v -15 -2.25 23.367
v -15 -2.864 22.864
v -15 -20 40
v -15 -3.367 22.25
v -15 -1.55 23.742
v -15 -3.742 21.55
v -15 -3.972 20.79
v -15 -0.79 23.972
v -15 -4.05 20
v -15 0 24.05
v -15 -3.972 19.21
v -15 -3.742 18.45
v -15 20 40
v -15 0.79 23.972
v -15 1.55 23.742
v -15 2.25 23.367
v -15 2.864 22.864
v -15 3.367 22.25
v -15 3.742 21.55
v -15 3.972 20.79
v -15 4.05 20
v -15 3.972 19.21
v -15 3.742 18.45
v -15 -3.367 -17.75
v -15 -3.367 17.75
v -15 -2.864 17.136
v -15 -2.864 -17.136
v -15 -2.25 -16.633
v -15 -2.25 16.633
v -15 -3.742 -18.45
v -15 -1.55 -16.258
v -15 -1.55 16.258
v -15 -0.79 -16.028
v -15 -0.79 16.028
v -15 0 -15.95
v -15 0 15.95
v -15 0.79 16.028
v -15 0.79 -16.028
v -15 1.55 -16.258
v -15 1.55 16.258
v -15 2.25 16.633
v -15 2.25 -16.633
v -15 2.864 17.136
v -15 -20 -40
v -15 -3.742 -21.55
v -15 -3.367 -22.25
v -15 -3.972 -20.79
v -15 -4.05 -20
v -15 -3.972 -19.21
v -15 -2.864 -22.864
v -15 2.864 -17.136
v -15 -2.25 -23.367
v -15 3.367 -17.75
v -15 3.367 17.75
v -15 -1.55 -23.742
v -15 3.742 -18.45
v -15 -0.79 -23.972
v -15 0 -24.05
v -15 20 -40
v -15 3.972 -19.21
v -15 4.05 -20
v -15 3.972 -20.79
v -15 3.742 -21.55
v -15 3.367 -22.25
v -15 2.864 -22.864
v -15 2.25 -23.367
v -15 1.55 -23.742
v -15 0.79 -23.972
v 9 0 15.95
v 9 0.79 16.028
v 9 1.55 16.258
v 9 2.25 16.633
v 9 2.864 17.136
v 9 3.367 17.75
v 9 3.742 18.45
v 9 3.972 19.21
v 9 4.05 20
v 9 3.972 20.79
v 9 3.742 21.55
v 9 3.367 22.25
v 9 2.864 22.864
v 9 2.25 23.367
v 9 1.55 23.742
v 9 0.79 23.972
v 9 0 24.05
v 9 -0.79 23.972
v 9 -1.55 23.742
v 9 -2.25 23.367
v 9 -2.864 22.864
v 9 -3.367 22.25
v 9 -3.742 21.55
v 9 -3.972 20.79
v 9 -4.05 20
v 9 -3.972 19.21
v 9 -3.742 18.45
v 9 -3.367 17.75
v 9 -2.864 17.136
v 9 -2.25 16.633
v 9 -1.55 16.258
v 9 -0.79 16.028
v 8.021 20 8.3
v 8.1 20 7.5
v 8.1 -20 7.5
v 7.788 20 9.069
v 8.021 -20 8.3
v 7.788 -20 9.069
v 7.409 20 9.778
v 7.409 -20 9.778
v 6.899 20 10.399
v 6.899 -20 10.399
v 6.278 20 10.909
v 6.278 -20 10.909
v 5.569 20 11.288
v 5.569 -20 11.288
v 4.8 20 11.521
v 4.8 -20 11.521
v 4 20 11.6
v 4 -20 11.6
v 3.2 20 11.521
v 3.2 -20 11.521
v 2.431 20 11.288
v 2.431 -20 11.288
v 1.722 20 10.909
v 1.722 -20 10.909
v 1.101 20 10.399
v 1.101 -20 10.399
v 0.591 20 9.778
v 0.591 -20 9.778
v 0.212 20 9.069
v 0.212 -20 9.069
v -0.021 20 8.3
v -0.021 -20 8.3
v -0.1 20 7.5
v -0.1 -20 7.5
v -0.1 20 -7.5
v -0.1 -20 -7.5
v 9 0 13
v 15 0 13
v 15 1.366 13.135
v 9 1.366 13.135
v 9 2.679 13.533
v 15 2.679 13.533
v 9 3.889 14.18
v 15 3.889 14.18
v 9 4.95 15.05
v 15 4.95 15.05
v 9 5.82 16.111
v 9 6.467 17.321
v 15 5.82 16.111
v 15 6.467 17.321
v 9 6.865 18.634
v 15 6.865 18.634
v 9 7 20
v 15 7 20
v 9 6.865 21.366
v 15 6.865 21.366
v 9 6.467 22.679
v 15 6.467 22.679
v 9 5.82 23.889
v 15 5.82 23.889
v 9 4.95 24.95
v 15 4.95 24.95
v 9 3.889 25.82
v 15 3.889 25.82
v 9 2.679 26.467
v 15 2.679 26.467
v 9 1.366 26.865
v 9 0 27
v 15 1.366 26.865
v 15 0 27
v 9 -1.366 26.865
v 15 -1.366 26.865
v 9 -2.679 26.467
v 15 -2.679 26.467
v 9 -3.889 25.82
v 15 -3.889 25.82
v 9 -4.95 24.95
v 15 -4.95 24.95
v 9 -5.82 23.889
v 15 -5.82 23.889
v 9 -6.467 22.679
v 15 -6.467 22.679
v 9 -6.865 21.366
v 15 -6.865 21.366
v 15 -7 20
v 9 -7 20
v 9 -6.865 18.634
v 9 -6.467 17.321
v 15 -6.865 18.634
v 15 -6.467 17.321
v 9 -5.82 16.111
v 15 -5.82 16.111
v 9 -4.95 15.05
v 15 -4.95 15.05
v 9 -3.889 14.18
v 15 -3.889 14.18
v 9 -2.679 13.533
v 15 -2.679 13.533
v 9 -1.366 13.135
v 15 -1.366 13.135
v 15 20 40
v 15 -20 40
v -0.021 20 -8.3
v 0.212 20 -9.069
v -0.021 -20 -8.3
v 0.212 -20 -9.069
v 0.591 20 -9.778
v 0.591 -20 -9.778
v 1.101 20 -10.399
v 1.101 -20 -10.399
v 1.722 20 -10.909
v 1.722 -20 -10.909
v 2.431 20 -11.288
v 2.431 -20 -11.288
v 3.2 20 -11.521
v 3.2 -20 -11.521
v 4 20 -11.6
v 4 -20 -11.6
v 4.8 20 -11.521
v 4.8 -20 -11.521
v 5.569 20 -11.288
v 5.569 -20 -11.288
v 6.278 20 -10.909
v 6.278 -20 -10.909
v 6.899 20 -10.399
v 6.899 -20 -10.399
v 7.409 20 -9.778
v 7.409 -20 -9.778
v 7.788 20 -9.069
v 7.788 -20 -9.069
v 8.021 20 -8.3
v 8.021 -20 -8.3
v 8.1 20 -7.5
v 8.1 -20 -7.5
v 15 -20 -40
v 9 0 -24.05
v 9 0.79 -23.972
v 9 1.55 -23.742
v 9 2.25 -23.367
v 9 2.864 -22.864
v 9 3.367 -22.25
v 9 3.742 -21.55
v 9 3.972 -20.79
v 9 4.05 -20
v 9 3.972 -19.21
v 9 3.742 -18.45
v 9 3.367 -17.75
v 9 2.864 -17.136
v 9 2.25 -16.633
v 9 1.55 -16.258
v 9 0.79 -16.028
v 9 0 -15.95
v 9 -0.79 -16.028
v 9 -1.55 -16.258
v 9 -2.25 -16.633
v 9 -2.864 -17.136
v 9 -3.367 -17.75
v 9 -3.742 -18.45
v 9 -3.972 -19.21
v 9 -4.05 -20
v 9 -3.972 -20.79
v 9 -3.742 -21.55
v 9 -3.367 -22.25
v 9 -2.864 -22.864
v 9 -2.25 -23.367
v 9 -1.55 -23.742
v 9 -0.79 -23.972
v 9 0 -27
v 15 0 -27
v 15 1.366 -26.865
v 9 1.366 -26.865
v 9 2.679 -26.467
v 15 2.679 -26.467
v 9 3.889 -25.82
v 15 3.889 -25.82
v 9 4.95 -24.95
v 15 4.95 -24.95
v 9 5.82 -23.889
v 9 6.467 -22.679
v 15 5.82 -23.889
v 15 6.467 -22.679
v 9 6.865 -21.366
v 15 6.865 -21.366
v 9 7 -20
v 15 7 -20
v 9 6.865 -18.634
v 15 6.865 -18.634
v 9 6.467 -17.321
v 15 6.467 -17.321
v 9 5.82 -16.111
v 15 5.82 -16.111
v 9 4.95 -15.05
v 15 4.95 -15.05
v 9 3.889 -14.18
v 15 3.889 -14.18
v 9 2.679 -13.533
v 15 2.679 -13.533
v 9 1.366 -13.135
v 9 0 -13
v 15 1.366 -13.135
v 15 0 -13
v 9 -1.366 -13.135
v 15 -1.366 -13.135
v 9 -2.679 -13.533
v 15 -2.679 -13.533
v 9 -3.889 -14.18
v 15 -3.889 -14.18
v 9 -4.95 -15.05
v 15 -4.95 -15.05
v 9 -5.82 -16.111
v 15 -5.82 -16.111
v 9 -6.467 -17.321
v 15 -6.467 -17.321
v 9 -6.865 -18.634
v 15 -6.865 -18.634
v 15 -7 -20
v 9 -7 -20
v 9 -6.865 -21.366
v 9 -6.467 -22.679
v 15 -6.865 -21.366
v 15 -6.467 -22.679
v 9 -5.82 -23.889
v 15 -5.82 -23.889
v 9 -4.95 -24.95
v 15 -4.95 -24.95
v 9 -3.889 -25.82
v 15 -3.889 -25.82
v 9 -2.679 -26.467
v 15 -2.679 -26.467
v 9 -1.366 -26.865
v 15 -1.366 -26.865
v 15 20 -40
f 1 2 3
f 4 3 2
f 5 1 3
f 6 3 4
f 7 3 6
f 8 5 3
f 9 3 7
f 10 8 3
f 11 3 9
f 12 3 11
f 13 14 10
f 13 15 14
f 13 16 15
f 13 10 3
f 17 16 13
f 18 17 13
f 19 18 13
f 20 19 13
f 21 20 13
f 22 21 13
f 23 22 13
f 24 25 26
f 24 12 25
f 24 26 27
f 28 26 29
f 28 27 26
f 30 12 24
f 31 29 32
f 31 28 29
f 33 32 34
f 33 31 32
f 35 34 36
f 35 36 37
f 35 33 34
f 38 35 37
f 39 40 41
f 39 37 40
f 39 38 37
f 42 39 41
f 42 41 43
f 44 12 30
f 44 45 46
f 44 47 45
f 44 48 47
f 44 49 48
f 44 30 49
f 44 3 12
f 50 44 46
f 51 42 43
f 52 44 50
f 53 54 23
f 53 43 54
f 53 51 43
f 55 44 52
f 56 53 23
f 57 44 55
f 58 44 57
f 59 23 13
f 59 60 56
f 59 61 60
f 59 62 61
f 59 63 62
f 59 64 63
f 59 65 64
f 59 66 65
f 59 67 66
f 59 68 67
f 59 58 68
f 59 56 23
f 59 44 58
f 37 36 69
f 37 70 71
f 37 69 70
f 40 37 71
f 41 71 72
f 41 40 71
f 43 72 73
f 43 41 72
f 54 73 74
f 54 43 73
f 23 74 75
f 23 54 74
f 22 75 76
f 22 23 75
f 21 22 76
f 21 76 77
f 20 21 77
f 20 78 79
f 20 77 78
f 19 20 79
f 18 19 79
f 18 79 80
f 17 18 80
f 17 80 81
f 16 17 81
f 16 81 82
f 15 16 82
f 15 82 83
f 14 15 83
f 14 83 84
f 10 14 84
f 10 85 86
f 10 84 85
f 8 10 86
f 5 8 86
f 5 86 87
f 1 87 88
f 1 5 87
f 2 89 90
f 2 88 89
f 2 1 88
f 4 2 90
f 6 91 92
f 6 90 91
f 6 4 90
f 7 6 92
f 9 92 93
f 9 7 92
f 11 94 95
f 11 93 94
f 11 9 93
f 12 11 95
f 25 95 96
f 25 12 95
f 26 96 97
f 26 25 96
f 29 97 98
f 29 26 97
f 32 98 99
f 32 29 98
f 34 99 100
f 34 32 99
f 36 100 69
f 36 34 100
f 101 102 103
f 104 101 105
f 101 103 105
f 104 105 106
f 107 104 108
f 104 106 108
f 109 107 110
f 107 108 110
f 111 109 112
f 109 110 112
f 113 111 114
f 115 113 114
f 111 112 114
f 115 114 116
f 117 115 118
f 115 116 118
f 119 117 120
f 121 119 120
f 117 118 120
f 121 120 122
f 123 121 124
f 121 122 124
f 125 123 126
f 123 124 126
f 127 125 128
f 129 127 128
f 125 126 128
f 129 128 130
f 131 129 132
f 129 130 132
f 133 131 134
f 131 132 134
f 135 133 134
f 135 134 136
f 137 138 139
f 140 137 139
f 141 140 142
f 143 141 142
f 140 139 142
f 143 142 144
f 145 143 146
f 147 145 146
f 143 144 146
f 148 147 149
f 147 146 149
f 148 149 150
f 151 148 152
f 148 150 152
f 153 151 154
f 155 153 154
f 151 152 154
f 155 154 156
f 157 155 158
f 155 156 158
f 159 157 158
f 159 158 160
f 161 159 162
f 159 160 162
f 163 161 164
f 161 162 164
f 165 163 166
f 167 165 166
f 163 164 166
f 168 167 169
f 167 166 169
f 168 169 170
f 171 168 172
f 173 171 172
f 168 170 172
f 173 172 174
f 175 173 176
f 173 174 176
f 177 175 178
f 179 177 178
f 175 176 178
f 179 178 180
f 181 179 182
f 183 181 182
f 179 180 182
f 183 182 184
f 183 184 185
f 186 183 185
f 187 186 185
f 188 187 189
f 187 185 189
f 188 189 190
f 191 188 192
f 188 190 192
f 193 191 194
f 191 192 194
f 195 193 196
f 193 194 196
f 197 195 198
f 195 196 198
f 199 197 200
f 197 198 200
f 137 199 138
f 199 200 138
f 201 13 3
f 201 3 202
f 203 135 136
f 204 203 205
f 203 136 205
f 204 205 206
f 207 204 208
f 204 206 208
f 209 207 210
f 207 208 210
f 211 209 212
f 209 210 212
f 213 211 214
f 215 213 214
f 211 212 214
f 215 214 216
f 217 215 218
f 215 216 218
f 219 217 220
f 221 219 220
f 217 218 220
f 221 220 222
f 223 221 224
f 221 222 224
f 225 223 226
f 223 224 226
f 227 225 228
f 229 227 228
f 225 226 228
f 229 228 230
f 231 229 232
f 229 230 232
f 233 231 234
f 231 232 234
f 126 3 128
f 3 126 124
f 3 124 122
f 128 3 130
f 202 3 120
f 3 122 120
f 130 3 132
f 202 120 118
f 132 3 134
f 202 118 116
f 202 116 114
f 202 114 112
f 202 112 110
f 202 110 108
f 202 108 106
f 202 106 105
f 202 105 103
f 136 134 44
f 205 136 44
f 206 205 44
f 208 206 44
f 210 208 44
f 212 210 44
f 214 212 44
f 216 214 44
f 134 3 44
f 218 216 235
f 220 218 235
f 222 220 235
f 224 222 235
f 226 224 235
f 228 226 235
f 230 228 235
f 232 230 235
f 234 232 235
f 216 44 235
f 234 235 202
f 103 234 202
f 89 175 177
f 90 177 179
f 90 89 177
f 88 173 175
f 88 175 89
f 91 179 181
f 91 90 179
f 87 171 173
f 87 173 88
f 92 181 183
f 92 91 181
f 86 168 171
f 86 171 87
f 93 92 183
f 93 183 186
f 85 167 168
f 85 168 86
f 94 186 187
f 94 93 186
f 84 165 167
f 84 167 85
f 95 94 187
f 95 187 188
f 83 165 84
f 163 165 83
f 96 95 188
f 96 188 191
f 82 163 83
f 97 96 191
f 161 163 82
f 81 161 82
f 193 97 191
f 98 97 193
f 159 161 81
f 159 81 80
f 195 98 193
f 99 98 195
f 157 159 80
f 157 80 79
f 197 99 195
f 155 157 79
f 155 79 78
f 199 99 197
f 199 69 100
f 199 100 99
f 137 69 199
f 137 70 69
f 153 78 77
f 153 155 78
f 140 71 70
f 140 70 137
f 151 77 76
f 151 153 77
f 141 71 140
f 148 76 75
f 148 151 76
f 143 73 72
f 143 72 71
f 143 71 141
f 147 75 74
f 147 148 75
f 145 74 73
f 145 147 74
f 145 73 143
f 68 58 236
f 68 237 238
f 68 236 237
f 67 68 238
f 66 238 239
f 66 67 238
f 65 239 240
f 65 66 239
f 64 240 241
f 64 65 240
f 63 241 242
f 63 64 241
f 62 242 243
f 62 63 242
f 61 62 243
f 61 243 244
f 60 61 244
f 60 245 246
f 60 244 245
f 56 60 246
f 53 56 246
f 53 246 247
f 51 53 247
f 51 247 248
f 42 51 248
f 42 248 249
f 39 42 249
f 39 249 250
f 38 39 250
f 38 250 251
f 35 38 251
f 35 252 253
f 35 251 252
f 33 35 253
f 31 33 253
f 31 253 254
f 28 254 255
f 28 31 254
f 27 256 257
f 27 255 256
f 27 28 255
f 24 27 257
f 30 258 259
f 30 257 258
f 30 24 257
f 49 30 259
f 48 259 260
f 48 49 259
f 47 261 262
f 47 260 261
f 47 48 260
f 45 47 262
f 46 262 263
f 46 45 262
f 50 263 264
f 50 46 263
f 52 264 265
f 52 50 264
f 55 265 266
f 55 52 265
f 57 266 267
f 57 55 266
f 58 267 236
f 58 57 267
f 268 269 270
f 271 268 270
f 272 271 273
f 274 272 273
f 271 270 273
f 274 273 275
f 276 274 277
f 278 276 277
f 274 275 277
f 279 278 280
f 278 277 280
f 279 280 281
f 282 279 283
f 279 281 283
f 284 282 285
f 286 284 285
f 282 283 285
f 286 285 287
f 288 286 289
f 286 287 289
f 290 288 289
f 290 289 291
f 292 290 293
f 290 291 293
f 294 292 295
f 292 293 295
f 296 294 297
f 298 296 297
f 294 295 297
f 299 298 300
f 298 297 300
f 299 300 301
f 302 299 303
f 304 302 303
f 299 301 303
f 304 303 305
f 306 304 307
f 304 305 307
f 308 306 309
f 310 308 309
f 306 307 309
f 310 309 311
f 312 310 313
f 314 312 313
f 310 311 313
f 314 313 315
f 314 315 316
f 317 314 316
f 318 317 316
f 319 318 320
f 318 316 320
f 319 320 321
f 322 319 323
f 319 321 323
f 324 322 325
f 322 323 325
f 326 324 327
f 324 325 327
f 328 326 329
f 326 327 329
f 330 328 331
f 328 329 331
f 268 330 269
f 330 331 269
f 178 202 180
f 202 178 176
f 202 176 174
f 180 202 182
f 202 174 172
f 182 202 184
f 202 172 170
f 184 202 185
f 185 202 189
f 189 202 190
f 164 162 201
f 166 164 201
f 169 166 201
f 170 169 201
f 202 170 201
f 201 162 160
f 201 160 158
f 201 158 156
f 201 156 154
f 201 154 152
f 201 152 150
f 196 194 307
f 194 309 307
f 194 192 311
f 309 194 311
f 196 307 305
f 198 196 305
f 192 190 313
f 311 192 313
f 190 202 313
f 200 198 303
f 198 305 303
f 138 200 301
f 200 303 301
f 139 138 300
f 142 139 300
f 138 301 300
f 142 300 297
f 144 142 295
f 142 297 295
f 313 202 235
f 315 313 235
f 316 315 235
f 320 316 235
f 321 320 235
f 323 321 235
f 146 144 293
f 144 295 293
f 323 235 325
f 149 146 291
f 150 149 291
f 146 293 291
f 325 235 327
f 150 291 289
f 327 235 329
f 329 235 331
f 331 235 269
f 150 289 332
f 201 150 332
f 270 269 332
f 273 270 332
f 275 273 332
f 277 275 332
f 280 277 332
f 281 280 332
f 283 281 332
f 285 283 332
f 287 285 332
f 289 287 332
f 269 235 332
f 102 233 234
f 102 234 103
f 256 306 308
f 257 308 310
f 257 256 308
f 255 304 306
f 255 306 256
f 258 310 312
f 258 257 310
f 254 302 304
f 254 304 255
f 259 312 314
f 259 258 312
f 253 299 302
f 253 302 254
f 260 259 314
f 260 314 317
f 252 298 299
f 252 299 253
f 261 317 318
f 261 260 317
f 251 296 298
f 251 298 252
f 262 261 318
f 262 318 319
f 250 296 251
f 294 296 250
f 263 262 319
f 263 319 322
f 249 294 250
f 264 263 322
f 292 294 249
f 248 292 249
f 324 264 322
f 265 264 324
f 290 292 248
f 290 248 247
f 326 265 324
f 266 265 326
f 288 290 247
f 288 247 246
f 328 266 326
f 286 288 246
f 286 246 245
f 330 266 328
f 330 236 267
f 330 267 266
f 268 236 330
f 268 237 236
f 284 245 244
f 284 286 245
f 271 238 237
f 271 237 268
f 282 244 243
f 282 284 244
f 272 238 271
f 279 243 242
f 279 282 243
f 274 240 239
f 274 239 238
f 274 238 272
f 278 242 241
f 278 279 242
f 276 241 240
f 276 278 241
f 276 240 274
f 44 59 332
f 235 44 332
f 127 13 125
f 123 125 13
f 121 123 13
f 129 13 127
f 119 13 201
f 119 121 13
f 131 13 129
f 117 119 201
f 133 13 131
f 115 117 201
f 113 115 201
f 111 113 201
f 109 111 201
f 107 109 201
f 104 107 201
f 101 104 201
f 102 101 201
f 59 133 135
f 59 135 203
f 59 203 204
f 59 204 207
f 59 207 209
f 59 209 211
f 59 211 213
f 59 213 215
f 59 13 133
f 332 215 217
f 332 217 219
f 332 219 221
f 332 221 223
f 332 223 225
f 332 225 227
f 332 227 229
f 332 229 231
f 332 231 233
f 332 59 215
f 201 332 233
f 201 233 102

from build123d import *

# Parameters (mm, degrees)
BOSS_EXTRUDE1_DEPTH      = 40
BOSS_EXTRUDE1_DEPTH_BACK = 40
SKETCH1_W                = 30
SKETCH1_H                = 40
CUT_EXTRUDE1_DEPTH       = 80
CUT_EXTRUDE1_DEPTH_BACK  = 80
SKETCH2_R                = 4.05
CUT_EXTRUDE2_START       = 15
SKETCH3_R                = 7
CUT_EXTRUDE2_DEPTH       = 6
CUT_EXTRUDE3_DEPTH       = 36
CUT_EXTRUDE3_DEPTH_BACK  = 36


with BuildPart() as part:
    # Sketch1 → Boss-Extrude1 (new, two sides: drawn at the far end of the back side and taken through both)
    with BuildSketch(Plane.XY.offset(-BOSS_EXTRUDE1_DEPTH_BACK)):
        Rectangle(SKETCH1_W, SKETCH1_H)
    extrude(amount=BOSS_EXTRUDE1_DEPTH + BOSS_EXTRUDE1_DEPTH_BACK)

    # Sketch2 → Cut-Extrude1 (cut, two sides: drawn at the far end of the back side and taken through both)
    with BuildSketch(Plane(origin=(0, 0, 0), x_dir=(0, 0, -1), z_dir=(1, 0, 0)).offset(-CUT_EXTRUDE1_DEPTH_BACK)):
        with Locations((-20, 0)):
            Circle(SKETCH2_R)
        with Locations((20, 0)):
            Circle(SKETCH2_R)
    extrude(amount=CUT_EXTRUDE1_DEPTH + CUT_EXTRUDE1_DEPTH_BACK, mode=Mode.SUBTRACT)

    # Sketch3 → Cut-Extrude2 (cut)
    with BuildSketch(Plane(origin=(0, 0, 0), x_dir=(0, 0, -1), z_dir=(1, 0, 0)).offset(CUT_EXTRUDE2_START)):
        with Locations((-20, 0)):
            Circle(SKETCH3_R)
        with Locations((20, 0)):
            Circle(SKETCH3_R)
    extrude(amount=-CUT_EXTRUDE2_DEPTH, mode=Mode.SUBTRACT)

    # Sketch4 → Cut-Extrude3 (cut, two sides: drawn at the far end of the back side and taken through both)
    with BuildSketch(Plane(origin=(0, 0, 0), x_dir=(1, 0, 0), z_dir=(0, 1, 0)).offset(-CUT_EXTRUDE3_DEPTH_BACK)):
        with BuildLine():
            Line((-0.1, -7.5), (-0.1, 7.5))
            ThreePointArc((-0.1, 7.5), (4, 11.6), (8.1, 7.5))
            Line((8.1, 7.5), (8.1, -7.5))
            ThreePointArc((8.1, -7.5), (4, -11.6), (-0.1, -7.5))
        make_face()
    extrude(amount=CUT_EXTRUDE3_DEPTH + CUT_EXTRUDE3_DEPTH_BACK, mode=Mode.SUBTRACT)


solid = part.part
